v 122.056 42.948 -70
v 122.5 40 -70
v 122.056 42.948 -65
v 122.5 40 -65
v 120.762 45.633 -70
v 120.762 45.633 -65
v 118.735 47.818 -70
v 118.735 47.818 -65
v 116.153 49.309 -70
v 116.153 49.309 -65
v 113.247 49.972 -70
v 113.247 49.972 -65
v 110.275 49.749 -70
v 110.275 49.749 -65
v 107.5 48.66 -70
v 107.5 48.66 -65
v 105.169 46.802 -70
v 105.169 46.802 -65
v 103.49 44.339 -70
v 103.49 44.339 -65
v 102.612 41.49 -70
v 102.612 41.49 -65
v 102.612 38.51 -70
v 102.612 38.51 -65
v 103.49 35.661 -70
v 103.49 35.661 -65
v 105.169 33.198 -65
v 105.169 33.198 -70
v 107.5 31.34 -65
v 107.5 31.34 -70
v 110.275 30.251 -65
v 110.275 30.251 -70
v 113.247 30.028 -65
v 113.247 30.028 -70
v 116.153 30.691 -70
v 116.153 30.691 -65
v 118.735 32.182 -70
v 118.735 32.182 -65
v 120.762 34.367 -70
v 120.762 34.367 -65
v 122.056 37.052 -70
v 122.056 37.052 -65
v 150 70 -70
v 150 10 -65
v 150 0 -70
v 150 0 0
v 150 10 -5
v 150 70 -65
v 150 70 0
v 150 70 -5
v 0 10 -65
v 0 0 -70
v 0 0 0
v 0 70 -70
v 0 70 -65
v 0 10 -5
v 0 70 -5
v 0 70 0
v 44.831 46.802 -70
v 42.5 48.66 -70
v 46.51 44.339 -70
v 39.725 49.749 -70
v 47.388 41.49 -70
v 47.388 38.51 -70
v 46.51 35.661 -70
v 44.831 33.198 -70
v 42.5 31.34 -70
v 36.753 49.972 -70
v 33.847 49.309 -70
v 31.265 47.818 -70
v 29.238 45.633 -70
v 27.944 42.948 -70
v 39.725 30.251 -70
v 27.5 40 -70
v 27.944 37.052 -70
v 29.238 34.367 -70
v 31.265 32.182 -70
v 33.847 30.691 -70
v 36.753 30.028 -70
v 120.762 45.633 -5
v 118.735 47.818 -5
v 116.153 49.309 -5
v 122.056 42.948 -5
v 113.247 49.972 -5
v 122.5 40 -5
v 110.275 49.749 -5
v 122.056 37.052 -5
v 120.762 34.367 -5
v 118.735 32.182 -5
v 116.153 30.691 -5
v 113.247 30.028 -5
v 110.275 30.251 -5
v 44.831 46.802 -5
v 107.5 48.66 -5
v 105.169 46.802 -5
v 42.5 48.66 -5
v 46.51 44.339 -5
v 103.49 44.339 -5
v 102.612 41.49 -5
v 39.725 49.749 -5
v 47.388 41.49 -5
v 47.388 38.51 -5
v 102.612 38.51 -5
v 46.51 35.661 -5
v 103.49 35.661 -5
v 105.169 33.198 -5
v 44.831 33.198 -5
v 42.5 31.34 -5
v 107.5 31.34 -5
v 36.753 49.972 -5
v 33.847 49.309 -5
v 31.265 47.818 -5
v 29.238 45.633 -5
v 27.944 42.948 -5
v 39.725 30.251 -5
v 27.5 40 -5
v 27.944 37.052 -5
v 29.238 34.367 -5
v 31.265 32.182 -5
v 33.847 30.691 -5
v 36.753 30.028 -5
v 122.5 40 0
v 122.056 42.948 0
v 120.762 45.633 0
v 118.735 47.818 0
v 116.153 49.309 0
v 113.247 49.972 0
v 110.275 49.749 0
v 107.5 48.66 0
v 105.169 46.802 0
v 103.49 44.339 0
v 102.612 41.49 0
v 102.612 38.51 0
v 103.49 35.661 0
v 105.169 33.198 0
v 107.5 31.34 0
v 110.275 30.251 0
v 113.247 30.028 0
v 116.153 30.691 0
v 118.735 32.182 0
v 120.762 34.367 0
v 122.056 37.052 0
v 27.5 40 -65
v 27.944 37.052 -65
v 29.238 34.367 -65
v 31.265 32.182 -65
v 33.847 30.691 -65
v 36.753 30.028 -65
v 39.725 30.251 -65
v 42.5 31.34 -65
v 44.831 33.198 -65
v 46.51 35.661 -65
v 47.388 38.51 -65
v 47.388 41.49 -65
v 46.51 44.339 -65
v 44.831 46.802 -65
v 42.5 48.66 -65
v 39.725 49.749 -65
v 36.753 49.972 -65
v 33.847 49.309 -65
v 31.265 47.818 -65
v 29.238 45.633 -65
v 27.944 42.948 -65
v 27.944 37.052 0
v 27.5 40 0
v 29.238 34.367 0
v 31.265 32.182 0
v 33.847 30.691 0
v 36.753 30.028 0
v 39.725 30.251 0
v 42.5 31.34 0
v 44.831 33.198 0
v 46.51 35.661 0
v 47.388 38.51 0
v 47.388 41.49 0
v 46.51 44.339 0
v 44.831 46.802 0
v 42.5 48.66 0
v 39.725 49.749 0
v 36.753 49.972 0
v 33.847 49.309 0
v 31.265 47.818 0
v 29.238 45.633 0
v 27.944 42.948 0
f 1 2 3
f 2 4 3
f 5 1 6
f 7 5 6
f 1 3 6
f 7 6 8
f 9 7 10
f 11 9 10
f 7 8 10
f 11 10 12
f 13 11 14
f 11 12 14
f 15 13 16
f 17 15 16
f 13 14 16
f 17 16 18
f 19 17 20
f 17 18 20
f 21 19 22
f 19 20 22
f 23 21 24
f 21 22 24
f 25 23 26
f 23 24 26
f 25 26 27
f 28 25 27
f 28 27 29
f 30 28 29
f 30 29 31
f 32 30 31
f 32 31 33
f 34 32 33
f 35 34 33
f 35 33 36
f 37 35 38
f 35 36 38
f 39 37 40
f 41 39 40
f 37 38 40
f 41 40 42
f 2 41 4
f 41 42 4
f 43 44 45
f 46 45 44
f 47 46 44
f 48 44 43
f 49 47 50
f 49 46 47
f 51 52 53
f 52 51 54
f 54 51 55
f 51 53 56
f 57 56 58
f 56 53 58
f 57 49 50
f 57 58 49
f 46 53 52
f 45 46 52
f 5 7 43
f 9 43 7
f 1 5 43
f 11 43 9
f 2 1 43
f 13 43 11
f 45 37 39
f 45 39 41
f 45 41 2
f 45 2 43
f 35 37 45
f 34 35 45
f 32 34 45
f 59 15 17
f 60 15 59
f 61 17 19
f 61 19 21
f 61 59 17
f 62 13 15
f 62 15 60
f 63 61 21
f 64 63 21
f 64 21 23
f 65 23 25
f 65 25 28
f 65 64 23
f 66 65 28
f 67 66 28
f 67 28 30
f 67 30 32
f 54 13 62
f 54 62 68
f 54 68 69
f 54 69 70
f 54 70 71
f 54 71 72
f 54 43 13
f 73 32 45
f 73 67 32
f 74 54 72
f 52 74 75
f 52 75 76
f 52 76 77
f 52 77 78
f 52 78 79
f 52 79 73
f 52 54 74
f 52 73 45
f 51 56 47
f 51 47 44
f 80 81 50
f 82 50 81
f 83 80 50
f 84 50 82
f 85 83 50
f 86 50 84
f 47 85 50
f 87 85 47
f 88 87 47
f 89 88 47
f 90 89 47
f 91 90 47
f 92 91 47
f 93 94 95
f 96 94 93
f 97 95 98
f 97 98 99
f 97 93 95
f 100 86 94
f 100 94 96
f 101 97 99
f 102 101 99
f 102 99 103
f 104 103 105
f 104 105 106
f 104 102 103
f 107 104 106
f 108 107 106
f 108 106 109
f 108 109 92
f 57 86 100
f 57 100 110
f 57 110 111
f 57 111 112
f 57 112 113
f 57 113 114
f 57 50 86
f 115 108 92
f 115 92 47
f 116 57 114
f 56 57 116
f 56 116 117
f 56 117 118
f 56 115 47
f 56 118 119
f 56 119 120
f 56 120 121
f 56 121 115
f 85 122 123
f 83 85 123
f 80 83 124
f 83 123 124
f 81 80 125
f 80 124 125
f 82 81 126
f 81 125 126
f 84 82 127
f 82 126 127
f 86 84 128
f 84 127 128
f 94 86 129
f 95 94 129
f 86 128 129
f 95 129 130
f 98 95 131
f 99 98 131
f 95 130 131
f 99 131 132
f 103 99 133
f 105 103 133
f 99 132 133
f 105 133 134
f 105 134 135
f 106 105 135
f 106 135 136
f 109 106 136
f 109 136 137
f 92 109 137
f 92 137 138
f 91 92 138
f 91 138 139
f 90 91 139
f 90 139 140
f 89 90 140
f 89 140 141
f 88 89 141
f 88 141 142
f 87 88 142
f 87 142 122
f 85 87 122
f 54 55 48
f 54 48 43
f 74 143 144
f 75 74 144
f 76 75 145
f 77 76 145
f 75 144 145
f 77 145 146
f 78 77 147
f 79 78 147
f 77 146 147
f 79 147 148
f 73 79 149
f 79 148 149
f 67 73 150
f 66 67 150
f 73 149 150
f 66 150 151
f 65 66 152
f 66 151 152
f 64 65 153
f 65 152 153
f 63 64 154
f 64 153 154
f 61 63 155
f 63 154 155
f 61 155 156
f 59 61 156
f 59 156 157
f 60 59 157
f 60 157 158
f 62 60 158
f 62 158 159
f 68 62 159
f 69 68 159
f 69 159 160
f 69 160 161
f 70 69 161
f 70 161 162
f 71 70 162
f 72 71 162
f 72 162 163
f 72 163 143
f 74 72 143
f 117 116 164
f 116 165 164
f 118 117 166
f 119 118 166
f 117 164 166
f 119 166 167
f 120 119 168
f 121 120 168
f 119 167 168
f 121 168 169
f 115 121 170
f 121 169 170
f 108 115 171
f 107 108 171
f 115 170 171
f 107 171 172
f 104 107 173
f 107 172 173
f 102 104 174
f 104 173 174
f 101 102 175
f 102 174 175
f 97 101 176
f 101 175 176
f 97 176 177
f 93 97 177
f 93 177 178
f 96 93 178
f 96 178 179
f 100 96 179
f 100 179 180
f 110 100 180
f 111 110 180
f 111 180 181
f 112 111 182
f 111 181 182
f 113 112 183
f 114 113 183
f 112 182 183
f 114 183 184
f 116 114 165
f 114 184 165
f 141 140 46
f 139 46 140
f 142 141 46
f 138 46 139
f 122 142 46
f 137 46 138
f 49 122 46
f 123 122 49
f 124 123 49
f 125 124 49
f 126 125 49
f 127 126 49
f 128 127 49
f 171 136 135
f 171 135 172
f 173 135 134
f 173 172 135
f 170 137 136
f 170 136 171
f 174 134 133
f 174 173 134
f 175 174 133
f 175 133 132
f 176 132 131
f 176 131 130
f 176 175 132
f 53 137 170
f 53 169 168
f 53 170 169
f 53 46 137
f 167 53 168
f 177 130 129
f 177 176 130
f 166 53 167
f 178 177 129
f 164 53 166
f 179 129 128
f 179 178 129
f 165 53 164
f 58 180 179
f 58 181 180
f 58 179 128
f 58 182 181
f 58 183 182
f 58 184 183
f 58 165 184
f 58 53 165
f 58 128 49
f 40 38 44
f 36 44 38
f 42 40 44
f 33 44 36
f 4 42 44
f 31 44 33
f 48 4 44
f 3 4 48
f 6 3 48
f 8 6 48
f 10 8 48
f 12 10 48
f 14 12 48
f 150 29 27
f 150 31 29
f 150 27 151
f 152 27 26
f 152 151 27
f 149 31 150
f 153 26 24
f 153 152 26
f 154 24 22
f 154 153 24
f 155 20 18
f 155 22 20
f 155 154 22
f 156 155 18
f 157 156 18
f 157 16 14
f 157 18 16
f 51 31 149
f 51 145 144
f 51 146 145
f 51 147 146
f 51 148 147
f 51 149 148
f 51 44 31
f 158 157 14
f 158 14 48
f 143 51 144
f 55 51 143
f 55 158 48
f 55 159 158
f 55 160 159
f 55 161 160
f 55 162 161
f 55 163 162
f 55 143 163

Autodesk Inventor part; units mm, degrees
ref_plane "YZ Plane" through (0, 0, 0) normal (1, 0, 0) x (0, 1, 0)
ref_plane "XZ Plane" through (0, 0, 0) normal (0, 1, 0) x (-1, 0, 0)
ref_plane "XY Plane" through (0, 0, 0) normal (0, 0, 1) x (1, 0, 0)
sketch "Sketch1" plane through (0, 0, 0) normal (1, 0, 0) x (0, 1, 0)
  line L0 (0, 0) -> (0, -70)
  line L1 (0, 0) -> (70, 0)
  line L2 (70, 0) -> (70, -5)
  line L3 (70, -5) -> (10, -5)
  line L4 (10, -5) -> (10, -65)
  line L5 (10, -65) -> (70, -65)
  line L6 (70, -65) -> (70, -70)
  line L7 (70, -70) -> (0, -70)
  dimension "d0" = 70
  dimension "d1" = 70
  dimension "d2" = 5
  dimension "d3" = 60
  dimension "d4" = 60
  dimension "d5" = 60
  dimension "d6" = 5
extrude "Extrusion1" add sketch "Sketch1" along normal blind 150
sketch "Sketch2" plane through (0, 0, 0) normal (0, 0, 1) x (1, 0, 0)
  line L0 (0, 0) -> (0, 70) projected
  line L1 (150, 70) -> (150, 0) projected
  line L2 (0, 10) -> (150, 10) projected
  line L3 (0, 70) -> (150, 70) projected
  line L4 (75, 70) -> (75, 10)
  line L5 (150, 10) -> (150, 70) projected
  line L6 (75, 70) -> (150, 10)
  line L7 (150, 70) -> (75, 10)
  circle A0 centre (112.5, 40) radius 10
  dimension "d9" = 150
  dimension "d10" = 20
extrude "Extrusion2" cut sketch "Sketch2" against normal blind 150 contours A0 L6 L7 | L7 L6 A0 | A0 L7 L6 | L6 L7 A0
ref_plane "Work Plane1" through (75, 0, 0) normal (1, 0, 0) x (0, 0, -1)
mirror "Mirror1" about plane through (75, 0, 0) normal (1, 0, 0) of "Extrusion2"
properties part number "baza"
